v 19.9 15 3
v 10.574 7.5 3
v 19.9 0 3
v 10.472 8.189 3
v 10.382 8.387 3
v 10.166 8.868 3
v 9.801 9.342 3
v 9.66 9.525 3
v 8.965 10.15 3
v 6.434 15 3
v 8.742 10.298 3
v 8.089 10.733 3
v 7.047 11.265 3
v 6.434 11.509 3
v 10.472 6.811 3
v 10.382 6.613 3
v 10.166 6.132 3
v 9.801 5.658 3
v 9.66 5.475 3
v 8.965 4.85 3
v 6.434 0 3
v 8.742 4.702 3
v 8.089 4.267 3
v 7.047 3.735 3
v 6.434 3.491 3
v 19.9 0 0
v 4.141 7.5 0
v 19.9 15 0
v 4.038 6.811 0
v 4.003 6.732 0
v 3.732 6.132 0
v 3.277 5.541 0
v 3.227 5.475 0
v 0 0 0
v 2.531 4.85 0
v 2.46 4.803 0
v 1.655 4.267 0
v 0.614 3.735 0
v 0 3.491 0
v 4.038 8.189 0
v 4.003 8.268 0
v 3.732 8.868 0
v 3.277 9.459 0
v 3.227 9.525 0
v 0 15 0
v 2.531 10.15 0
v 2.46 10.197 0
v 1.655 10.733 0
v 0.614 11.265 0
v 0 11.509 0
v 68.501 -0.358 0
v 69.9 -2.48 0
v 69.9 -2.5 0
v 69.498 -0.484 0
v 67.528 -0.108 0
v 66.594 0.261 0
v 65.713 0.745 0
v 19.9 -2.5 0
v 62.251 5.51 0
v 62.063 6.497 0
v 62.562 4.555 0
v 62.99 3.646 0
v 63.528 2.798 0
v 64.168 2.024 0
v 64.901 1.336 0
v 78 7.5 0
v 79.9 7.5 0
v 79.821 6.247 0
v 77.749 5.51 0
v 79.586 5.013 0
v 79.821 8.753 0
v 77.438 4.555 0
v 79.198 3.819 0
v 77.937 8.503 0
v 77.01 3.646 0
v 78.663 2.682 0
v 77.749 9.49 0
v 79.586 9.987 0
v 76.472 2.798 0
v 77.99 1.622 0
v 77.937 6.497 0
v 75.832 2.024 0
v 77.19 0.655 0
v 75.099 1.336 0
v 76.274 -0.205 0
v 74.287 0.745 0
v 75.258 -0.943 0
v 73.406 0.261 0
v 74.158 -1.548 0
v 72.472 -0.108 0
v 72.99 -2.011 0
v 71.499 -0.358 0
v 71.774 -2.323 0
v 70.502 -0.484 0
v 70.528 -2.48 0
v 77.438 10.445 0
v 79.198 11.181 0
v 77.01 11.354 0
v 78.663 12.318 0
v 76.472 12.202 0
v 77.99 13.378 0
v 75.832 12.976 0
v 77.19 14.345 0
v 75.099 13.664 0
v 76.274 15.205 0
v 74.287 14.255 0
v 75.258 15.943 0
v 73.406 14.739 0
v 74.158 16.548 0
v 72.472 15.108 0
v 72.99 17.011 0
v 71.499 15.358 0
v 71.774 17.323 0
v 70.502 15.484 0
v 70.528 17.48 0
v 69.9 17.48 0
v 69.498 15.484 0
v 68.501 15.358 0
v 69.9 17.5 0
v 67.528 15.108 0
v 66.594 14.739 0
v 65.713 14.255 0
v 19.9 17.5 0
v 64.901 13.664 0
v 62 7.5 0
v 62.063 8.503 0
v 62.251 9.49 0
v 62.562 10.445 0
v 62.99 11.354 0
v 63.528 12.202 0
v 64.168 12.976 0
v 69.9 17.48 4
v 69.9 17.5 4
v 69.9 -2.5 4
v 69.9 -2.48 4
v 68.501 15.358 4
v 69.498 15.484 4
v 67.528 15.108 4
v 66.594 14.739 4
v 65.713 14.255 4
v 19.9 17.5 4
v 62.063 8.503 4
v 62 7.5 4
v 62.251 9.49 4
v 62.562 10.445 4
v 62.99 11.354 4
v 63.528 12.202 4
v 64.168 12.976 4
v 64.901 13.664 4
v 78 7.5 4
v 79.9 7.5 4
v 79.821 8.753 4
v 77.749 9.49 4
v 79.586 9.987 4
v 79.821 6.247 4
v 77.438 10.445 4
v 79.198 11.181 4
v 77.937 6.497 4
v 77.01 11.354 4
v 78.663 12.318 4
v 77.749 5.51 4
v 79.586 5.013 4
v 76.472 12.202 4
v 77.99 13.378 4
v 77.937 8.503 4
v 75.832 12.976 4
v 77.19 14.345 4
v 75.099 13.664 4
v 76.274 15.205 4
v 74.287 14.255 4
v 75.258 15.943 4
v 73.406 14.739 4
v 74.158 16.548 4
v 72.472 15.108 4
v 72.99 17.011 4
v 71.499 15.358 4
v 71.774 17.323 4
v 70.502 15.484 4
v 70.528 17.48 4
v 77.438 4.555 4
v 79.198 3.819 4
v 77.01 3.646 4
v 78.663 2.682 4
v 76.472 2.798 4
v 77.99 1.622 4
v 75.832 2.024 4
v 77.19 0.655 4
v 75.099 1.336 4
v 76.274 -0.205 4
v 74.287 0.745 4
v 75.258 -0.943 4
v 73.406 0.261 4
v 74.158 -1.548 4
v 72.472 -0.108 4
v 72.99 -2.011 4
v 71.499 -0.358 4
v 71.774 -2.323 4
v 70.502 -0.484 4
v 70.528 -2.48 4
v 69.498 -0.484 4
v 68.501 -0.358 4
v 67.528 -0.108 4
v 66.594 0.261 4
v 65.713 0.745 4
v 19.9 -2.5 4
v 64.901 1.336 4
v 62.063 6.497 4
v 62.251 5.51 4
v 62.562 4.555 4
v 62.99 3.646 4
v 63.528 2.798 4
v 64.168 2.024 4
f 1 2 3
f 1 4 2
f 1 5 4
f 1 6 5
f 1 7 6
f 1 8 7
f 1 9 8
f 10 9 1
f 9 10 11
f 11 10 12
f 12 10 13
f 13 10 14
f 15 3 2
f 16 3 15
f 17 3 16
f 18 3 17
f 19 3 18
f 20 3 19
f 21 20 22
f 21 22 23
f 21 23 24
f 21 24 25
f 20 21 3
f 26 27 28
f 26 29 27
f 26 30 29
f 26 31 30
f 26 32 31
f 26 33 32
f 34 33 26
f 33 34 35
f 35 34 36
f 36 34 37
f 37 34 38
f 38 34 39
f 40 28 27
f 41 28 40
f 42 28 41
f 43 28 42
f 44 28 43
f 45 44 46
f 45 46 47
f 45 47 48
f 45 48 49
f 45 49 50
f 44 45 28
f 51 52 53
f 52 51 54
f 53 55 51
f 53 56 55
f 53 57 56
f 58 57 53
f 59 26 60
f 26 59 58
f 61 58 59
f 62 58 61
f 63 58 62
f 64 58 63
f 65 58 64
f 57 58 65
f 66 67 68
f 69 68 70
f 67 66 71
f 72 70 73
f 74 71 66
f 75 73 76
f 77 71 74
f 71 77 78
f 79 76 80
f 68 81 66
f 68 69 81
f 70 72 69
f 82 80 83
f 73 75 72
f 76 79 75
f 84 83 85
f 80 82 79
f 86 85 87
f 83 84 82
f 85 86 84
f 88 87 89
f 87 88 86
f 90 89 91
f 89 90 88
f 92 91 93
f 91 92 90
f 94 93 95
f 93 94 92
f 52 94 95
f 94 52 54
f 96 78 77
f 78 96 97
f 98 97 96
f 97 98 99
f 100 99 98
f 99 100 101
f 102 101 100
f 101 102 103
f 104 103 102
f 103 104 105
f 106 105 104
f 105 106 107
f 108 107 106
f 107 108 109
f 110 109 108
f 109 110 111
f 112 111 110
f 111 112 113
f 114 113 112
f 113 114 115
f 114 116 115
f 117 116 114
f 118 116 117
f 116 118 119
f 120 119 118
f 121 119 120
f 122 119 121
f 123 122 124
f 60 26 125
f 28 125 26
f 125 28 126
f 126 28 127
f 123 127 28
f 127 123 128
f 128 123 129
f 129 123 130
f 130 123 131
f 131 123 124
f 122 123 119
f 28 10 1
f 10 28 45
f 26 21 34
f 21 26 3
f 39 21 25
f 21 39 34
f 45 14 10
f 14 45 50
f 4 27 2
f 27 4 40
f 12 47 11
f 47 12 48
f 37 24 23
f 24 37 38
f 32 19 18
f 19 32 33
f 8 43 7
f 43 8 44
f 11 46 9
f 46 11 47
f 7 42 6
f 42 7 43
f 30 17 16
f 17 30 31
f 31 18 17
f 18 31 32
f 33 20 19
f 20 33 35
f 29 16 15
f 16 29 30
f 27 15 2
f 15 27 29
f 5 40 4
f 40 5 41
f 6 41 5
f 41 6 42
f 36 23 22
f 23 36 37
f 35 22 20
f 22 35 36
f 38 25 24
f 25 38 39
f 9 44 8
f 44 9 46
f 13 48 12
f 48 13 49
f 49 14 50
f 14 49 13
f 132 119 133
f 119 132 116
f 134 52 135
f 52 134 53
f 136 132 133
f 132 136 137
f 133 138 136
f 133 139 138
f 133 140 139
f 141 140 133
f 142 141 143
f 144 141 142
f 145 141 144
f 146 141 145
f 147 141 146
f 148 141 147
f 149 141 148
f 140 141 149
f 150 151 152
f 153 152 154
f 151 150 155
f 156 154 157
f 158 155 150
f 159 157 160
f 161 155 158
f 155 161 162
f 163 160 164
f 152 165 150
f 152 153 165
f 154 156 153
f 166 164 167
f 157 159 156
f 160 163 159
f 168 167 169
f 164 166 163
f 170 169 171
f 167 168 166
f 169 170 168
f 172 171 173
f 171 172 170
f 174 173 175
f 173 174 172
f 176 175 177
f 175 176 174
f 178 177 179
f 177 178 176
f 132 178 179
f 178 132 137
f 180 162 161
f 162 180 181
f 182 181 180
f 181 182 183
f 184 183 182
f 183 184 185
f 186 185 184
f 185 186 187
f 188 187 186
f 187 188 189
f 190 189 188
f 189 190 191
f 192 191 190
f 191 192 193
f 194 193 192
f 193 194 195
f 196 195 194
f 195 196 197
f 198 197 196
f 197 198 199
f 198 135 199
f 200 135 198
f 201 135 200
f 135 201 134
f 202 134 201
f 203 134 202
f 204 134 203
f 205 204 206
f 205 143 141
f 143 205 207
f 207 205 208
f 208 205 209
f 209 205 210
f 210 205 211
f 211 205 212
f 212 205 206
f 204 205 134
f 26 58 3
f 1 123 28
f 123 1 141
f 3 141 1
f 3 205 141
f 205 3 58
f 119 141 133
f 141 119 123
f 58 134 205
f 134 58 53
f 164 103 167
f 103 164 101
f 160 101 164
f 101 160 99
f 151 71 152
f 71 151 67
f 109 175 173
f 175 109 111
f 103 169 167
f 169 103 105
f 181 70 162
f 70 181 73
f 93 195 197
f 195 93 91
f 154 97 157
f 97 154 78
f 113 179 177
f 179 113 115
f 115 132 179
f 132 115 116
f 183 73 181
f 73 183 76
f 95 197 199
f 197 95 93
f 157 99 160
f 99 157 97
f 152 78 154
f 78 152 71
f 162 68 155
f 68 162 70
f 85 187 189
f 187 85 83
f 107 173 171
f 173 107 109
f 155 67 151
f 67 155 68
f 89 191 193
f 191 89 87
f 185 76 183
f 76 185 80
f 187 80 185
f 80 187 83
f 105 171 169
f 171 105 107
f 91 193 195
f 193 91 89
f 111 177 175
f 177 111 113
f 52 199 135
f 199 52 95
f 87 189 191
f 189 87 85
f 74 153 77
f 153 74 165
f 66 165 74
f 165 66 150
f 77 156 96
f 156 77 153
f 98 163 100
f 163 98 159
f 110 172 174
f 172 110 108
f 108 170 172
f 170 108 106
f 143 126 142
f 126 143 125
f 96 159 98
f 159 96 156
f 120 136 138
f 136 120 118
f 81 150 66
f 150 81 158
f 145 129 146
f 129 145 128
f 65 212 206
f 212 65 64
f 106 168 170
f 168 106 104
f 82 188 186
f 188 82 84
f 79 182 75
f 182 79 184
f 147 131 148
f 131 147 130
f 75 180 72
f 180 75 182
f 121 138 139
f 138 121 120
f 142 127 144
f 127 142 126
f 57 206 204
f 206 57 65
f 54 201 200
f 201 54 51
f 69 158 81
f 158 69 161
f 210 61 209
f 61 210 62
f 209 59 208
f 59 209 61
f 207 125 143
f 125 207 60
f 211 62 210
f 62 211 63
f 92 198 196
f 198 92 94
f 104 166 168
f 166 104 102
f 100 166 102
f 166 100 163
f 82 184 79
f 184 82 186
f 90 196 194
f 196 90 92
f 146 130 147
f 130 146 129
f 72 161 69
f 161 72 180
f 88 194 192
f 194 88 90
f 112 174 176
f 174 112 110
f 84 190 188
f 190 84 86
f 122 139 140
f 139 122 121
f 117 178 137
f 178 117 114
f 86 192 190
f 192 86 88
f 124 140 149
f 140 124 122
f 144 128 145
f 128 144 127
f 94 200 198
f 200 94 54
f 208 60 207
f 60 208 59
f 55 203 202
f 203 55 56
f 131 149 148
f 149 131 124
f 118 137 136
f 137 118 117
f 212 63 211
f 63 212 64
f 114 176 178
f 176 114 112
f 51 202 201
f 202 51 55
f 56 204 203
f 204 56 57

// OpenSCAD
handleL=50;
handleW=20;
handleH=4;
spadeL=20;
spadeW=15;
spadeH=3;
tineW=2;
tineAngle=25;
keyringT=2;

difference(){
union(){
difference(){

	cube([spadeL,spadeW,spadeH]);
	//translate([0,spadeW/2,-1])
	//	cylinder(r=spadeW/2-tineW,h=spadeH+2,$fn=50);
	rotate([0,-tineAngle,0])
		translate([0,-1,0])
			cube([spadeL,spadeW+2,spadeH*2]);
	rotate([0,90-tineAngle,0])
	translate([-spadeW/4,spadeW/2,-1])
		cylinder(r=spadeW/2-tineW,h=spadeL*2,$fn=50);
}
translate([spadeL-0.1,(spadeW-handleW)/2,0]){
	cube([handleL,handleW,handleH]);
	translate([handleL,handleW/2,0])
		cylinder(r=handleW/2,h=handleH,$fn=50);
}
}
translate([spadeL+handleL,handleW/2-(handleW-spadeW)/2,-1])
	cylinder(r=handleW/2-keyringT,h=handleH+2,$fn=50);
}
	
